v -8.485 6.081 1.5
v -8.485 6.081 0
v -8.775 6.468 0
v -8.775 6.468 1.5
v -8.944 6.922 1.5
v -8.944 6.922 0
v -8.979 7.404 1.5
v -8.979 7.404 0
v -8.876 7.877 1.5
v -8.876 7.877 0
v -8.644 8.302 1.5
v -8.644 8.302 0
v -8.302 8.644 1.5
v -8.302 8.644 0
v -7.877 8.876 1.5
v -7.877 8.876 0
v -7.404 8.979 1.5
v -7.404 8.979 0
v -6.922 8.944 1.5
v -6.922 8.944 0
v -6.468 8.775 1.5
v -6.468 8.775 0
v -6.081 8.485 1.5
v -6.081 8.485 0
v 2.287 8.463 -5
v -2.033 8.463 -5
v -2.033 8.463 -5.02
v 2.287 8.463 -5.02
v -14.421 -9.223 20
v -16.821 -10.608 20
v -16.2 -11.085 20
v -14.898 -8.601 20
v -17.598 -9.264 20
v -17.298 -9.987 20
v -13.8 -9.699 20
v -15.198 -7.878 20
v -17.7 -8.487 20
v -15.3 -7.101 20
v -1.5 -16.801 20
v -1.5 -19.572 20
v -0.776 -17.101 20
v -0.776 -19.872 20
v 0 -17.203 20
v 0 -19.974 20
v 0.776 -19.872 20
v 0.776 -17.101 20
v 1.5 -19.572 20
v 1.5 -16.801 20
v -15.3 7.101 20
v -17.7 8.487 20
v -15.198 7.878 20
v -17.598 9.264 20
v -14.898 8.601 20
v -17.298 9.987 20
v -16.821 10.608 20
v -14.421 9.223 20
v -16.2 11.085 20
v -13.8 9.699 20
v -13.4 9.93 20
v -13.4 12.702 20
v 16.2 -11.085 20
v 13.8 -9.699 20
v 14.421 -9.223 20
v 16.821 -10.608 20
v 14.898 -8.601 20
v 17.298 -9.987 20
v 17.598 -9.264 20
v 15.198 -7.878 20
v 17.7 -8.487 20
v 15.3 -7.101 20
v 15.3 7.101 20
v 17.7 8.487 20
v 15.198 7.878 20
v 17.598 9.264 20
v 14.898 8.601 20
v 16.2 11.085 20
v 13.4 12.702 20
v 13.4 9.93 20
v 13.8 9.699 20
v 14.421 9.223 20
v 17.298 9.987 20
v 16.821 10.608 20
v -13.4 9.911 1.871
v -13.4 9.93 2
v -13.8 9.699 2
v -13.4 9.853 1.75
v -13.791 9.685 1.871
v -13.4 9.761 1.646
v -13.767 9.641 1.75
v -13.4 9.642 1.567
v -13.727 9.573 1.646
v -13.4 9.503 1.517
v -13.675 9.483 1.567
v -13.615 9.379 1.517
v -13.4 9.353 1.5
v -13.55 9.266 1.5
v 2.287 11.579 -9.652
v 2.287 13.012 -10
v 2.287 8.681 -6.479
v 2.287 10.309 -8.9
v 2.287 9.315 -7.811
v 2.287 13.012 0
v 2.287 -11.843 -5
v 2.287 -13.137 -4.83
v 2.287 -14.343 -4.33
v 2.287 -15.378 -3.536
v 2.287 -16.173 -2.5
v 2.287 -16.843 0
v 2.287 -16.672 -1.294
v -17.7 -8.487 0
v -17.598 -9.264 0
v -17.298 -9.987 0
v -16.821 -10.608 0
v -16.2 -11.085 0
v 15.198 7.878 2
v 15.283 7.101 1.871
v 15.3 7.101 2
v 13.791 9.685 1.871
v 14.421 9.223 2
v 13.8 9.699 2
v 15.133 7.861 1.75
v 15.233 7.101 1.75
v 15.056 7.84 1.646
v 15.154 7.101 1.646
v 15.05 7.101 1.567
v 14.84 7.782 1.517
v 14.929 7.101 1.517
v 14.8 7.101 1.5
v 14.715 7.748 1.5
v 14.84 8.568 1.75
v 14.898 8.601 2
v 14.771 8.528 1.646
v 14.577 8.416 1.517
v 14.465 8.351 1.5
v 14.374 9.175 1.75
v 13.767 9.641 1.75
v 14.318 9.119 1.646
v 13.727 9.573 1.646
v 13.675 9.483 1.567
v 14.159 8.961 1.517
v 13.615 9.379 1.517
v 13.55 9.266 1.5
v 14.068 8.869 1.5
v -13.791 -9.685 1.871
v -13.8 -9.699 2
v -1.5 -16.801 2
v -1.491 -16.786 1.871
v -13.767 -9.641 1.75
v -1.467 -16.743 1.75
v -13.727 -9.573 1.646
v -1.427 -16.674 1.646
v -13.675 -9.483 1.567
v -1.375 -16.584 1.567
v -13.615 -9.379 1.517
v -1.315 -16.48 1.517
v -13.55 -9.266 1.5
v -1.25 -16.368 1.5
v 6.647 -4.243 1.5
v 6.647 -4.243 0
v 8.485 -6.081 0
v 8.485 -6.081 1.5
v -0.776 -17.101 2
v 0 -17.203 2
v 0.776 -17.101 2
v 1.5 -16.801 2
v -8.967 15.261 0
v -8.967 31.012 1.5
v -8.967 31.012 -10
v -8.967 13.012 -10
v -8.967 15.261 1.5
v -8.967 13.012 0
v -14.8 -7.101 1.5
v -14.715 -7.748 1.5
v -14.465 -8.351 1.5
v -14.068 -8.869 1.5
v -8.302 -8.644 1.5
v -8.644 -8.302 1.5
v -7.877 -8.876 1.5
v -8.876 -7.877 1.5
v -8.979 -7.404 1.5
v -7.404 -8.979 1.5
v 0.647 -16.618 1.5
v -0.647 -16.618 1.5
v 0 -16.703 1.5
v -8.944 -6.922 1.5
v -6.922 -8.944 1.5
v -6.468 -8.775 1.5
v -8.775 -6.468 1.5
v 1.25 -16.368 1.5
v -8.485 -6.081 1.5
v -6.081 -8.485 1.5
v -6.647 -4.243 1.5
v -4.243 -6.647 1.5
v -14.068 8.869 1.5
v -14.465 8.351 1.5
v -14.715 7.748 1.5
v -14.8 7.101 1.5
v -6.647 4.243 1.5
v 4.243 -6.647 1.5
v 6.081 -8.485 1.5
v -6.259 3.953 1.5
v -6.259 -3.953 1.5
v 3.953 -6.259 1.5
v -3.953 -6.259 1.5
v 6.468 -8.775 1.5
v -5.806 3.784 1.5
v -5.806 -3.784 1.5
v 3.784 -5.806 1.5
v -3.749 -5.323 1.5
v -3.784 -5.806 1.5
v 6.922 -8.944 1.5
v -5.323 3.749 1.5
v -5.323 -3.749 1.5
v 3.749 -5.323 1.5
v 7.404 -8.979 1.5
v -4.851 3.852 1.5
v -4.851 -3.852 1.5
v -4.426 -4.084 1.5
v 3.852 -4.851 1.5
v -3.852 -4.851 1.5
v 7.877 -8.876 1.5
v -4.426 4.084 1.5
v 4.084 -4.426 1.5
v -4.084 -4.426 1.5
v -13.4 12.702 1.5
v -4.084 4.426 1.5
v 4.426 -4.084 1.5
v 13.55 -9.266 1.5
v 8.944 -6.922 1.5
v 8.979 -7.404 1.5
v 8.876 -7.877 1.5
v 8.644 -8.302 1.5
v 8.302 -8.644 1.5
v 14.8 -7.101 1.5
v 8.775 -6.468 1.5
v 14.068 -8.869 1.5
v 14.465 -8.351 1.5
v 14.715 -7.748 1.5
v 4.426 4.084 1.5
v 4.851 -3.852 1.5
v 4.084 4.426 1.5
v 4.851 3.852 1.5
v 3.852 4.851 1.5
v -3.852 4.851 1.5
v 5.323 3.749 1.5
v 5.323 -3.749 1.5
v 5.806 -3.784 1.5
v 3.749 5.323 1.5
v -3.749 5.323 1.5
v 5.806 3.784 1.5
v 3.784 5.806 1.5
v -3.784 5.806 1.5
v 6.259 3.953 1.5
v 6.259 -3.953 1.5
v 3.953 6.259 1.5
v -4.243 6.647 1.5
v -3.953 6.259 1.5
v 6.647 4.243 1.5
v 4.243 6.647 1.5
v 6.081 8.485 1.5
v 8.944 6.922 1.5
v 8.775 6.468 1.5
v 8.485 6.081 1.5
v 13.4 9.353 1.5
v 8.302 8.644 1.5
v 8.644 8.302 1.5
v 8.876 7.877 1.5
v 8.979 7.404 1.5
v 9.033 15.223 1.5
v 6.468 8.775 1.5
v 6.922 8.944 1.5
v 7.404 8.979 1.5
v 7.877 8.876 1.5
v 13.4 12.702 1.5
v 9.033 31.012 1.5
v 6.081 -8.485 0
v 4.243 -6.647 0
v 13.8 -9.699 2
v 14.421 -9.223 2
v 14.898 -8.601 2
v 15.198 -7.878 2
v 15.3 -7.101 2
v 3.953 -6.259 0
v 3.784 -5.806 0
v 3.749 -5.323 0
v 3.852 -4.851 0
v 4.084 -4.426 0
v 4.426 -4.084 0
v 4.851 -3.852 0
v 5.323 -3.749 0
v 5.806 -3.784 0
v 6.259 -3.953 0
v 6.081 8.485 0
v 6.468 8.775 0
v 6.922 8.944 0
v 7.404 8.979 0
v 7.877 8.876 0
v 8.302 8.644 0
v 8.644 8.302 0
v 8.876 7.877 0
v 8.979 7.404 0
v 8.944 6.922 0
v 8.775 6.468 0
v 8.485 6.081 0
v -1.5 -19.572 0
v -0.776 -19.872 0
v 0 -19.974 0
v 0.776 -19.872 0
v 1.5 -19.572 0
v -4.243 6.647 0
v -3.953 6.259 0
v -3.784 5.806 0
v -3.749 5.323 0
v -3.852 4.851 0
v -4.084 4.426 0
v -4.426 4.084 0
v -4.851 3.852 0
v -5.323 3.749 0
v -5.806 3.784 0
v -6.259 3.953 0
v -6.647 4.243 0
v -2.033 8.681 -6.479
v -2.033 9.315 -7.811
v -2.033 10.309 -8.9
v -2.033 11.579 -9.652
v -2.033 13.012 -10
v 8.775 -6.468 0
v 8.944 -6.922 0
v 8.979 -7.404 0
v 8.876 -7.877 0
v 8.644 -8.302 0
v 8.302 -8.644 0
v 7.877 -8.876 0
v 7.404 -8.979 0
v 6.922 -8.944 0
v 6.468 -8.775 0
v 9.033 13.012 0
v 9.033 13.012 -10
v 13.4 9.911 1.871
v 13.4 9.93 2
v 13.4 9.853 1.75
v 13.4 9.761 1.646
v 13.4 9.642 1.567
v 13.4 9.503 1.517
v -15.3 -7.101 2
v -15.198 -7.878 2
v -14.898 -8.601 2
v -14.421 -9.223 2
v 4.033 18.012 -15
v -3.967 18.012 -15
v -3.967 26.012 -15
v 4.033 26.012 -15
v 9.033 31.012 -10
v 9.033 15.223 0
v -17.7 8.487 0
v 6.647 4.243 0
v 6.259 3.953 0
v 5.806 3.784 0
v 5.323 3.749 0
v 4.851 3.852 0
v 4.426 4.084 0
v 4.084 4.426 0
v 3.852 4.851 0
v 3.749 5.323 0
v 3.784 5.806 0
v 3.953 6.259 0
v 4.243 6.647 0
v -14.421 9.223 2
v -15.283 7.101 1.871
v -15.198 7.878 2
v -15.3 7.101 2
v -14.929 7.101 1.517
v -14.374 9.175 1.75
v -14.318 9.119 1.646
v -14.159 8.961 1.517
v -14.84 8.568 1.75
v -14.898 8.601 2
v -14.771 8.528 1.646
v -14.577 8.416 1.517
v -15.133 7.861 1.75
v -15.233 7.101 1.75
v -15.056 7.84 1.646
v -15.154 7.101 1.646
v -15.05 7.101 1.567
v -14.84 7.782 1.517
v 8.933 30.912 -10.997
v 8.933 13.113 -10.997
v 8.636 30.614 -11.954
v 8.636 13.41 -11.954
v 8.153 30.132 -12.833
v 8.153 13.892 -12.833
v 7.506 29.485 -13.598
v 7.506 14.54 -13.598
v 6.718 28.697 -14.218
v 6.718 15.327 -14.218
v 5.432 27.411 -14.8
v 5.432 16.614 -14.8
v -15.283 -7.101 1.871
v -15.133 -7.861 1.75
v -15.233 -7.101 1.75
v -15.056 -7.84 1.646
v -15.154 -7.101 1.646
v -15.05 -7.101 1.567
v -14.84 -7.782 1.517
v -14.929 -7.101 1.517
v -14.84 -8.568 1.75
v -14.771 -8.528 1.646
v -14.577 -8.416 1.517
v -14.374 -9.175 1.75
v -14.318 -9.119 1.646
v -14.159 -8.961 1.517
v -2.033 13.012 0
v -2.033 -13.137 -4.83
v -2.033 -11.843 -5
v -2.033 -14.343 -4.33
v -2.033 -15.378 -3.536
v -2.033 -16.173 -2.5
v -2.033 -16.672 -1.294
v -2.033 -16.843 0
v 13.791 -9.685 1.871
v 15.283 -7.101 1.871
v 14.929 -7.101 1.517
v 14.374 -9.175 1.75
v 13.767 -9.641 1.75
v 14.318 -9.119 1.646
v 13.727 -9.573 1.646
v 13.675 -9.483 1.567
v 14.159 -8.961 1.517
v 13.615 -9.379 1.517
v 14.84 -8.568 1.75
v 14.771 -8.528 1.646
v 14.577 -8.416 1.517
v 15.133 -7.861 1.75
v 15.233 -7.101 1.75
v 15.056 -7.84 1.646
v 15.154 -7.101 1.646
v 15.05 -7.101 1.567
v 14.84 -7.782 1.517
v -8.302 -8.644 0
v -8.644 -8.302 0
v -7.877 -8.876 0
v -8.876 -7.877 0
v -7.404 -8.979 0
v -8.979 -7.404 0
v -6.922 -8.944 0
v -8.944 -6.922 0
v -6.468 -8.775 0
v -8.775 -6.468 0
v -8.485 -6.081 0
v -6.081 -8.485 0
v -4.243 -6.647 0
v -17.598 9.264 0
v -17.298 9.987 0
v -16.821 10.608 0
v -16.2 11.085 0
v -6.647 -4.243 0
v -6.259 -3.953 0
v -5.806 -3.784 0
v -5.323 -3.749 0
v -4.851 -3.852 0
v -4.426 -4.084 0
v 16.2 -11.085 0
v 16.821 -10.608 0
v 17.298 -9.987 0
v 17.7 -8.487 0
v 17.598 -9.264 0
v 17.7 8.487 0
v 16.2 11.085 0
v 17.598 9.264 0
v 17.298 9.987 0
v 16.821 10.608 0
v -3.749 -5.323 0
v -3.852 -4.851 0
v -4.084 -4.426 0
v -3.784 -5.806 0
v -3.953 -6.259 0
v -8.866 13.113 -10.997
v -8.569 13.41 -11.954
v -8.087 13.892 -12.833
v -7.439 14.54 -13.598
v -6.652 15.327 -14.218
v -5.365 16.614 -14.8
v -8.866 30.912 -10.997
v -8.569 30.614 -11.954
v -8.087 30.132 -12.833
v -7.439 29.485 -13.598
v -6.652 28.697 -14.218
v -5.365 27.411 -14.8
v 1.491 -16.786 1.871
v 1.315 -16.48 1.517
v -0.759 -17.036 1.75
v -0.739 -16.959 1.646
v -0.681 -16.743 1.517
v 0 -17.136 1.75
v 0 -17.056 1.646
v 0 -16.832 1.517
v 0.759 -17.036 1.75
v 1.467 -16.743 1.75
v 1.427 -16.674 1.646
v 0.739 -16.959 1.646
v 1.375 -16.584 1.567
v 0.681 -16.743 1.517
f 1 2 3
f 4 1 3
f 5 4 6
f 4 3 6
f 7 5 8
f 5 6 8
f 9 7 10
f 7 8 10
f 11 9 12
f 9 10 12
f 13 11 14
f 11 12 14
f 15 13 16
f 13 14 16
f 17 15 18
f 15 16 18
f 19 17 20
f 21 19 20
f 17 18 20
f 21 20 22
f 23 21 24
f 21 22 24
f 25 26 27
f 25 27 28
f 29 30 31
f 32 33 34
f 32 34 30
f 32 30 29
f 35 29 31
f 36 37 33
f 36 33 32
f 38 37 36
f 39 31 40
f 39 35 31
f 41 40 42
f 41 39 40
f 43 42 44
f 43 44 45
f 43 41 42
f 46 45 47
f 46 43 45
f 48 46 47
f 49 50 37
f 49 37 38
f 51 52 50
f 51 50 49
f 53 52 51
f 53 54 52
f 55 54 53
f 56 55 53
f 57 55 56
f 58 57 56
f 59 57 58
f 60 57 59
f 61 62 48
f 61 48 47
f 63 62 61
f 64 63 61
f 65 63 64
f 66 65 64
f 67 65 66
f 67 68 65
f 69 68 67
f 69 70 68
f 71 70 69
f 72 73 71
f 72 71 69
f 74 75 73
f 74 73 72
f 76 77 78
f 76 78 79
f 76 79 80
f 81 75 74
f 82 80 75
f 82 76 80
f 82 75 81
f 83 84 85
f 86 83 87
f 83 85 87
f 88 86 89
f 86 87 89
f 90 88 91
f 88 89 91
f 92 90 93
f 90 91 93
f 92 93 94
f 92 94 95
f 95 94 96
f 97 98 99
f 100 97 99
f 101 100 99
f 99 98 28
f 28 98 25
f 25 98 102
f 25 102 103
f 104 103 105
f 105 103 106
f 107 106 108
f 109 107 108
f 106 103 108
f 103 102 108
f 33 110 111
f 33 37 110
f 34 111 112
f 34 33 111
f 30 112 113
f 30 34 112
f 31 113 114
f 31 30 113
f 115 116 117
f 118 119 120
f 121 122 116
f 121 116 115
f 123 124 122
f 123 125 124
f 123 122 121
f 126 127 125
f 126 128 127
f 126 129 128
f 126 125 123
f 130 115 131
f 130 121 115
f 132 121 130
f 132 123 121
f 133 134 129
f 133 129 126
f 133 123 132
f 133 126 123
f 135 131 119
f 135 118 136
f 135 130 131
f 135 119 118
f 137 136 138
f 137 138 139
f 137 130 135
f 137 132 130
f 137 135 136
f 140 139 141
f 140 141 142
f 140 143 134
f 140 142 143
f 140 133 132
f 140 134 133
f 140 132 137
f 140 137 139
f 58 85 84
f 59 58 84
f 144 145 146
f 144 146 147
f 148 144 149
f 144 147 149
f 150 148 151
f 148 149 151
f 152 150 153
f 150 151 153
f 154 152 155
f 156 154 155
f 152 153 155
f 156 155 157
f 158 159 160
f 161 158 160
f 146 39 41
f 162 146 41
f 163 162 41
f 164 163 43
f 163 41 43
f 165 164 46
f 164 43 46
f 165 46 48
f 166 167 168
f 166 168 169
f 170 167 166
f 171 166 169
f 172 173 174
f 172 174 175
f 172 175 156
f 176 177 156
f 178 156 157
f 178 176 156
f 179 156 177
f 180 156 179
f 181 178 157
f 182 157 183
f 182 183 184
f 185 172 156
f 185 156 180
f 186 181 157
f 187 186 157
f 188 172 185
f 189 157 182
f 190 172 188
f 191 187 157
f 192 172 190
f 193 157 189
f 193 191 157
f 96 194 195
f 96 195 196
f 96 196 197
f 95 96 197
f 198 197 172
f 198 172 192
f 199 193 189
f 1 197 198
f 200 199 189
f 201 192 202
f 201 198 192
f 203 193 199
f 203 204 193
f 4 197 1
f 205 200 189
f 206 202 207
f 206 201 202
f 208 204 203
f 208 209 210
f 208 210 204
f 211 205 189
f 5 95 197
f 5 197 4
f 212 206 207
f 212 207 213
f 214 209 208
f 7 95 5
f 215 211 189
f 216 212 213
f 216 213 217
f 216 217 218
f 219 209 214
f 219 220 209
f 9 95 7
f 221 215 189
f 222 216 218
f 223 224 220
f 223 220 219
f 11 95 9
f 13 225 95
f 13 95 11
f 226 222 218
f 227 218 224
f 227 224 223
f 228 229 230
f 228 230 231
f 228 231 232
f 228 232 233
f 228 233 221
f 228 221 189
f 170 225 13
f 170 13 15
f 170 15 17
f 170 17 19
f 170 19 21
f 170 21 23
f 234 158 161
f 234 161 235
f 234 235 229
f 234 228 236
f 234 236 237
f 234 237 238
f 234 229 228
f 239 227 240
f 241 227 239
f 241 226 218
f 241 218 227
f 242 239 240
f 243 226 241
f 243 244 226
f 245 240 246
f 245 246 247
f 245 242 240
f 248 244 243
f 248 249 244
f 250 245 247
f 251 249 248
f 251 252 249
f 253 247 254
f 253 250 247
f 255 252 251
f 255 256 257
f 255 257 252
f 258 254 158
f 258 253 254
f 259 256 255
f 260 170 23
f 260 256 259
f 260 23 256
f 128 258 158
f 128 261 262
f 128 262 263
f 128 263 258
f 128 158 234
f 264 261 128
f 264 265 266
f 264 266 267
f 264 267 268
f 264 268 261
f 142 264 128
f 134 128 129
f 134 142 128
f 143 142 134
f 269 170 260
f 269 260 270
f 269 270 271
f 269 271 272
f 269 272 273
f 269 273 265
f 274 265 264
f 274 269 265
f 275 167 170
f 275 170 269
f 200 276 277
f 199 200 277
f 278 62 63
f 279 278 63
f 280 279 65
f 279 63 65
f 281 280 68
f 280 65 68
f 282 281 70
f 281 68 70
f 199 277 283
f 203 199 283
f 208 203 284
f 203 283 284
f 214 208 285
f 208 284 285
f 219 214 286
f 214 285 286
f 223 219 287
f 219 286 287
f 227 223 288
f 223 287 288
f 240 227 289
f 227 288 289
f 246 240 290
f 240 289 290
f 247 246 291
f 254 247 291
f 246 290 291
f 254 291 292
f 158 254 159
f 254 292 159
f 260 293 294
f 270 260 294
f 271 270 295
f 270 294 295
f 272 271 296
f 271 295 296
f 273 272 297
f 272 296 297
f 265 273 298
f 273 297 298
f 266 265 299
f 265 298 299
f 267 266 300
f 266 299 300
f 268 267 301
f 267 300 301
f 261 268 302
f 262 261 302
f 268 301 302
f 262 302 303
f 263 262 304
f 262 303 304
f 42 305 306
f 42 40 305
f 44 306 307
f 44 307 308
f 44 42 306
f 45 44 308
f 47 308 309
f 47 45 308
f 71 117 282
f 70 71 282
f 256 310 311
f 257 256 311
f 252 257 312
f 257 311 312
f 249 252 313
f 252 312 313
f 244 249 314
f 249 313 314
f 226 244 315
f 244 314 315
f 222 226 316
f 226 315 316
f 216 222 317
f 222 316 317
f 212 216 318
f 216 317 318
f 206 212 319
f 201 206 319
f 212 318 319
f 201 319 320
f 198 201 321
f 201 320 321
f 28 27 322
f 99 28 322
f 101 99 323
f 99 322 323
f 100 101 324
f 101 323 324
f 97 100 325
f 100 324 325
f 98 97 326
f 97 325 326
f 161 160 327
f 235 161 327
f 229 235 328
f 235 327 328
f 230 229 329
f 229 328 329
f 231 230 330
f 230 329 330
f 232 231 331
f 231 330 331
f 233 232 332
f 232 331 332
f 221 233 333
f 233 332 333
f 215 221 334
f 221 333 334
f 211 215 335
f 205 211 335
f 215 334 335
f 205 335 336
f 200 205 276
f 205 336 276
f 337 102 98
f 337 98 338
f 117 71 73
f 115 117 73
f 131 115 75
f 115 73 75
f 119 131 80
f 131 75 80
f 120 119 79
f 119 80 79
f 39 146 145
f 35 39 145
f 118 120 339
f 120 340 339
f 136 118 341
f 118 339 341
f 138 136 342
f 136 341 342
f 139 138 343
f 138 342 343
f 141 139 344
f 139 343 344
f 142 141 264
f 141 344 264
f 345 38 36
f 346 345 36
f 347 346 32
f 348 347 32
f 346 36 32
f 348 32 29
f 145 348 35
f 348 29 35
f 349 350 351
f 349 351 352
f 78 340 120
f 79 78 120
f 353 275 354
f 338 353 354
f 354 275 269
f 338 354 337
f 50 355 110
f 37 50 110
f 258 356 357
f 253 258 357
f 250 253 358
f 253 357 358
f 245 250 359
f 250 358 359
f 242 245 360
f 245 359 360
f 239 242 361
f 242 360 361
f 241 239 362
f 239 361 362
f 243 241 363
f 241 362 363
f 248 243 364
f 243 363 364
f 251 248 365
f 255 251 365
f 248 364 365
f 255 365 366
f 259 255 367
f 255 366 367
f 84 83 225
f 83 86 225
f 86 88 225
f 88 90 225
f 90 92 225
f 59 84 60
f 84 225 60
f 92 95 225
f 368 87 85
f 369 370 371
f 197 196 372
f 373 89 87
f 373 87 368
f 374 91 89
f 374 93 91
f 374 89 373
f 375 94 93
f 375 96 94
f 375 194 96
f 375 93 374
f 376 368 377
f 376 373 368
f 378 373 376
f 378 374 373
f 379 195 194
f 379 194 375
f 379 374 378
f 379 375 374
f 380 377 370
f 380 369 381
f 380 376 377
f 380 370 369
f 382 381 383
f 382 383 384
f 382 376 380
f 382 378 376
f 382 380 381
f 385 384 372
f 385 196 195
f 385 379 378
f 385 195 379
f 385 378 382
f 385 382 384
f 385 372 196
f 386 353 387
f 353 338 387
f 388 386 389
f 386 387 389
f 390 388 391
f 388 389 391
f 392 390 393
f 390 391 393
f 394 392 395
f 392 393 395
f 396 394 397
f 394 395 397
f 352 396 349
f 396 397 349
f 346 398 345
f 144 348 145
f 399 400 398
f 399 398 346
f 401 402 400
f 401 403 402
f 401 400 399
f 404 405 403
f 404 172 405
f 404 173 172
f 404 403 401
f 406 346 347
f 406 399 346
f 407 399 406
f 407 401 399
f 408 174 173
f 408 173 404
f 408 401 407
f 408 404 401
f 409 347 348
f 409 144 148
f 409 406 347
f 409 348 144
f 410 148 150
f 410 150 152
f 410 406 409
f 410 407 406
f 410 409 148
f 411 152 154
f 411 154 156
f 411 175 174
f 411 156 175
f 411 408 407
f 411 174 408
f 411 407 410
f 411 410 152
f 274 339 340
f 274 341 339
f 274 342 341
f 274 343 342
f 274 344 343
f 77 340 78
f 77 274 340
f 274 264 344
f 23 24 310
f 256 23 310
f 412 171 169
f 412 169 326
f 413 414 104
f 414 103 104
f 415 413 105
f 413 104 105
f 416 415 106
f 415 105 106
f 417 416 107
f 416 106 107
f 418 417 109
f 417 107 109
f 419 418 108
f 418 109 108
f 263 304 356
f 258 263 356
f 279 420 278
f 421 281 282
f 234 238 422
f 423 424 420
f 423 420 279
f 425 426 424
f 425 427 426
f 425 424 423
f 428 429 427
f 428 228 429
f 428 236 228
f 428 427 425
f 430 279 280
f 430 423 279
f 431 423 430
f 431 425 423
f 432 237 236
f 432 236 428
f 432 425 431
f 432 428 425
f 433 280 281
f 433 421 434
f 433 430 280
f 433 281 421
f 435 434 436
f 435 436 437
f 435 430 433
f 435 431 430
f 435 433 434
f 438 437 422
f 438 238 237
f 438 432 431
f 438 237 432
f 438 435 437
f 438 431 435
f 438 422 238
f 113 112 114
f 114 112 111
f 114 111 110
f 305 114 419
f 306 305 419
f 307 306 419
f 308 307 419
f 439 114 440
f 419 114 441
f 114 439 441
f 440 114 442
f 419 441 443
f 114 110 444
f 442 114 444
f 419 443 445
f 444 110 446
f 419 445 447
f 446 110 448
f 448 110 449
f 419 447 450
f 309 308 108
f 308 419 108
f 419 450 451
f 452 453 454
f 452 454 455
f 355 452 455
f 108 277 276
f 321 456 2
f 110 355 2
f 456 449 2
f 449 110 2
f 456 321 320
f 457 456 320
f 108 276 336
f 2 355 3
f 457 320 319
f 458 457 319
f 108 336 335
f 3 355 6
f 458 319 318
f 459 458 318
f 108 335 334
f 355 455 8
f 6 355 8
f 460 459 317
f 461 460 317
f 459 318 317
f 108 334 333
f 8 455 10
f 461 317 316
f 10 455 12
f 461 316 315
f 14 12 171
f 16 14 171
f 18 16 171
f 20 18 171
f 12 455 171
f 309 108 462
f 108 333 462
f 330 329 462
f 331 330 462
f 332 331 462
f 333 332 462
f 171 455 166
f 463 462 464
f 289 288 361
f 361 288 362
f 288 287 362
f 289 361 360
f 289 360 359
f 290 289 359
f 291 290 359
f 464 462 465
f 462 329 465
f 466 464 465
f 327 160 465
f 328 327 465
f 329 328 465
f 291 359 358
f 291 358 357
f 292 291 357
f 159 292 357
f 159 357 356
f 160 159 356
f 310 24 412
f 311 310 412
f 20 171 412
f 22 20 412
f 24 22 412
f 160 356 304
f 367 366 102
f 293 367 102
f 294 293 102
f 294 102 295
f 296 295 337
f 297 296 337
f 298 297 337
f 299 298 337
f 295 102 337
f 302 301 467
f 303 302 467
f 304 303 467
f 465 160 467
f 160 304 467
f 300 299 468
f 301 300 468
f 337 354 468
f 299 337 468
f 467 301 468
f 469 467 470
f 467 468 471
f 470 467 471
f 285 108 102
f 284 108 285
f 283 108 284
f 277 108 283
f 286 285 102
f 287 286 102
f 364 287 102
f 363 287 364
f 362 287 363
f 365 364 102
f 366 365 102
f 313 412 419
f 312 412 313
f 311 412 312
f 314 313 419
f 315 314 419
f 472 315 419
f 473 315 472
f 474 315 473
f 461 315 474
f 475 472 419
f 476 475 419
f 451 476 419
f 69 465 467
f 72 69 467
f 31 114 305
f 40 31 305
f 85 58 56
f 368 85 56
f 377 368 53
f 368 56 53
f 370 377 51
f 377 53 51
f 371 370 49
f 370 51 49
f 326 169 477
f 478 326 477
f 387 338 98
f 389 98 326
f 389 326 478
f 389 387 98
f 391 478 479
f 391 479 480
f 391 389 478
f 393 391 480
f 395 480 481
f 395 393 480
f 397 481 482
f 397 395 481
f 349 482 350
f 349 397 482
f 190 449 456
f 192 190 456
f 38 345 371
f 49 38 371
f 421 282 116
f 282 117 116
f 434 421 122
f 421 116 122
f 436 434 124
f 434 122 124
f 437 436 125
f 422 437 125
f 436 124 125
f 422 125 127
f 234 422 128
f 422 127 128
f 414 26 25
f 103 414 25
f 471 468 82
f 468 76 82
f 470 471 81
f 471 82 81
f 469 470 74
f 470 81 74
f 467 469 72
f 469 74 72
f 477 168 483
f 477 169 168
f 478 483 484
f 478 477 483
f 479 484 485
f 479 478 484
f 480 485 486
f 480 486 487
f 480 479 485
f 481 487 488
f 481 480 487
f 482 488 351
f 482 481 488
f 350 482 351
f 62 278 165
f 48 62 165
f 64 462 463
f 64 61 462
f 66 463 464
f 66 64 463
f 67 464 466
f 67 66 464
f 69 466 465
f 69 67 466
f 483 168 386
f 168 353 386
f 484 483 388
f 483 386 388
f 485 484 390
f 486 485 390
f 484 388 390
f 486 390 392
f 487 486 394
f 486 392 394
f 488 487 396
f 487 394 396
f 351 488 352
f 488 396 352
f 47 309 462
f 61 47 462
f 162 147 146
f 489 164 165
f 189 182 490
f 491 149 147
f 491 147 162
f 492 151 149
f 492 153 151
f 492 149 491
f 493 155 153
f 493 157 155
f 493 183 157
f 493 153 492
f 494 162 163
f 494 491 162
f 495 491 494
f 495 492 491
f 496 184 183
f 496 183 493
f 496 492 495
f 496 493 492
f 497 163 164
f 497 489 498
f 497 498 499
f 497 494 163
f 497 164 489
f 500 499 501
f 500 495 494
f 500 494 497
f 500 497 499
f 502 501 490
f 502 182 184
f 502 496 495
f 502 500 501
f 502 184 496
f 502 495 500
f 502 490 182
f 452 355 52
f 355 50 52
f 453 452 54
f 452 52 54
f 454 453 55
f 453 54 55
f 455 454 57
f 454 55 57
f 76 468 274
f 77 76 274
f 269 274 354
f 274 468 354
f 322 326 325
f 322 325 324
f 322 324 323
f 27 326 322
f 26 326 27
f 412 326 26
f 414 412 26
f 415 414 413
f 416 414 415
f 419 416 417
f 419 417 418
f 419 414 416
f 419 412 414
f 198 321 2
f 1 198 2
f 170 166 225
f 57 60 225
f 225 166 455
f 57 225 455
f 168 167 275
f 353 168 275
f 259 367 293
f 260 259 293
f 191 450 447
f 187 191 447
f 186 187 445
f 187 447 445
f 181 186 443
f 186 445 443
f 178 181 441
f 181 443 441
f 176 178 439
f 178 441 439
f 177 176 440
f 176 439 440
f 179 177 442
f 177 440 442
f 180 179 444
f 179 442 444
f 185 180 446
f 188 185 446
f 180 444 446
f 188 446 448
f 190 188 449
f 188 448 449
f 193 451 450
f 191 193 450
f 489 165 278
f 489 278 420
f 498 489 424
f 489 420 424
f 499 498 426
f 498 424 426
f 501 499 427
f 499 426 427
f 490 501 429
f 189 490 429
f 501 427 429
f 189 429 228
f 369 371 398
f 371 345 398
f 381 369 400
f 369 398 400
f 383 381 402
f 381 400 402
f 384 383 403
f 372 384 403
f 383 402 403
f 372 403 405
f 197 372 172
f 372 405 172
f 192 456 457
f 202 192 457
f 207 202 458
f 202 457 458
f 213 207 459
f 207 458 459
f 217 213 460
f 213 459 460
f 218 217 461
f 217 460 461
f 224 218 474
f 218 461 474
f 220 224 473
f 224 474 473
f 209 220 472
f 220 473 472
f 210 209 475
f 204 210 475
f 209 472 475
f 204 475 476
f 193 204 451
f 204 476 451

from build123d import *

# Parameters (mm, degrees)
F1_DEPTH     = 1.5
F2_DEPTH     = 20
F4_W         = 26.8
F4_H         = 20.4379309565
F5_DEPTH     = 26
F6_R         = 3
F7_R         = 0.5
F9_DEPTH     = 1.5
F10_W        = 18
F10_H        = 18
F11_DEPTH    = 15
F12_R        = 5
F13_W        = 4.3204394169
F13_H        = 29.8547168866
F14_DEPTH    = 5
F15_R        = 4.99999
F16_W        = 4.3204394169
F16_H        = 4.5489102274
F17_DEPTH    = 5
F18_T1_DEPTH = 29.218490554


# Not quite as in the source:
# - a fillet or chamfer that OpenCascade refuses, or shapes differently, is made with other operations: its cross-section is extruded or revolved along the edge and cut away or added
# - a fillet or chamfer is up to 0.001 mm smaller than in the source, because OpenCascade refuses the exact size


with BuildPart() as f1:
    # F0 (on Top) → F1 (new body)
    with BuildSketch(Plane.XY):
        Polygon((0, -17.6669182372), (15.3, -8.8334591186), (15.3, 8.8334591186), (0, 17.6669182372), (-15.3, 8.8334591186), (-15.3, -8.8334591186), align=None)
        with BuildLine():
            ThreePointArc((-6.0811183182, -8.4852813742), (-8.4852813742, -8.4852813742), (-8.4852813742, -6.0811183182))
            Line((-8.4852813742, -6.0811183182), (-6.6468037432, -4.2426406871))
            ThreePointArc((-6.6468037432, -4.2426406871), (-4.2426406871, -4.2426406871), (-4.2426406871, -6.6468037432))
            Line((-4.2426406871, -6.6468037432), (-6.0811183182, -8.4852813742))
        make_face(mode=Mode.SUBTRACT)
        with BuildLine():
            ThreePointArc((8.4852813742, -6.0811183182), (8.4852813742, -8.4852813742), (6.0811183182, -8.4852813742))
            Line((6.0811183182, -8.4852813742), (4.2426406871, -6.6468037432))
            ThreePointArc((4.2426406871, -6.6468037432), (4.2426406871, -4.2426406871), (6.6468037432, -4.2426406871))
            Line((6.6468037432, -4.2426406871), (8.4852813742, -6.0811183182))
        make_face(mode=Mode.SUBTRACT)
        with BuildLine():
            ThreePointArc((-8.4852813742, 6.0811183182), (-8.4852813742, 8.4852813742), (-6.0811183182, 8.4852813742))
            Line((-6.0811183182, 8.4852813742), (-4.2426406871, 6.6468037432))
            ThreePointArc((-4.2426406871, 6.6468037432), (-4.2426406871, 4.2426406871), (-6.6468037432, 4.2426406871))
            Line((-6.6468037432, 4.2426406871), (-8.4852813742, 6.0811183182))
        make_face(mode=Mode.SUBTRACT)
        with BuildLine():
            Line((4.2426406871, 6.6468037432), (6.0811183182, 8.4852813742))
            ThreePointArc((6.0811183182, 8.4852813742), (8.4852813742, 8.4852813742), (8.4852813742, 6.0811183182))
            Line((8.4852813742, 6.0811183182), (6.6468037432, 4.2426406871))
            ThreePointArc((6.6468037432, 4.2426406871), (4.2426406871, 4.2426406871), (4.2426406871, 6.6468037432))
        make_face(mode=Mode.SUBTRACT)
    extrude(amount=F1_DEPTH)

    # F0 (on Top) → F2 (join)
    with BuildSketch(Plane.XY):
        Polygon((-17.7, 10.2190997647), (-17.7, -10.2190997647), (0, -20.4381995293), (17.7, -10.2190997647), (17.7, 10.2190997647), (0, 20.4381995293), align=None)
        Polygon((15.3, 8.8334591186), (15.3, -8.8334591186), (0, -17.6669182372), (-15.3, -8.8334591186), (-15.3, 8.8334591186), (0, 17.6669182372), align=None, mode=Mode.SUBTRACT)
    extrude(amount=F2_DEPTH)

    # F4 (on offset) → F5 (cut)
    with BuildSketch(Plane.XZ.offset(-25)):
        with Locations((0, 11.7189654782)):
            Rectangle(F4_W, F4_H)
    extrude(amount=F5_DEPTH, mode=Mode.SUBTRACT)

    # F6
    f6_edges = [f1.edges().sort_by_distance(p)[0] for p in [
        (17.7, 10.2191, 10),
        (-17.7, 10.2191, 10),
        (-17.7, -10.2191, 10),
        (0, -20.4382, 10),
        (17.7, -10.2191, 10),
        (15.3, 8.833459, 10.75),
        (15.3, -8.833459, 10.75),
        (0, -17.666918, 10.75),
        (-15.3, -8.833459, 10.75),
        (-15.3, 8.833459, 10.75),
    ]]
    fillet(f6_edges, radius=F6_R)

    # F7
    f7_edges = [f1.edges().sort_by_distance(p)[0] for p in [
        (-13.6, 9.814955, 1.5),
        (0, 20.4382, 0.75),
        (-7.65, -13.250189, 1.5),
        (-14.898076, -8.601408, 1.5),
        (0, -17.202817, 1.5),
        (-15.3, 0, 1.5),
        (7.65, -13.250189, 1.5),
        (-14.898076, 8.601408, 1.5),
        (14.898076, -8.601408, 1.5),
        (15.3, 0, 1.5),
        (14.898076, 8.601408, 1.5),
        (13.6, 9.814955, 1.5),
    ]]
    fillet(f7_edges, radius=F7_R)

    # F8 (on face) → F9 (join)
    with BuildSketch(Plane.XY.offset(1.5)):
        with BuildLine():
            Line((-8.9667634256, 31.0121076152), (-8.9667634256, 15.2612362518))
            Line((-8.9667634256, 15.2612362518), (-0.25, 20.293861962))
            ThreePointArc((-0.25, 20.293861962), (0, 20.3608492601), (0.25, 20.293861962))
            Line((0.25, 20.293861962), (9.0332365744, 15.2228579614))
            Line((9.0332365744, 15.2228579614), (9.0332365744, 31.0121076152))
            Line((9.0332365744, 31.0121076152), (-8.9667634256, 31.0121076152))
        make_face()
    extrude(amount=-F9_DEPTH)

    # F10 (on face) → F11 (join)
    with BuildSketch(Plane(origin=(0, 0, 0), x_dir=(1, 0, 0), z_dir=(0, 0, -1))):
        with Locations((0.0332365744, -22.0121076152)):
            Rectangle(F10_W, F10_H)
    extrude(amount=F11_DEPTH)

    # F12
    f12_edges = [f1.edges().sort_by_distance(p)[0] for p in [
        (9.033237, 22.012108, -15),
        (0.033237, 13.012108, -15),
        (-8.966763, 22.012108, -15),
        (0.033237, 31.012108, -15),
    ]]
    fillet(f12_edges, radius=F12_R)

    # F13 (on face) → F14 (join)
    with BuildSketch(Plane(origin=(0, 0, 0), x_dir=(1, 0, 0), z_dir=(0, 0, -1))):
        with Locations((0.1270717476, 1.9152508281)):
            Rectangle(F13_W, F13_H)
    extrude(amount=F14_DEPTH)

    # F15 (radius 5 in the source; OpenCascade refuses exactly that, so slightly less here)
    f15_edges = [f1.edges().sort_by_distance(p)[0] for p in [
        (0.127072, -16.842609, -5),
    ]]
    fillet(f15_edges, radius=F15_R)

    # F16 (on face) → F17 (join)
    with BuildSketch(Plane(origin=(0, 0, -5), x_dir=(1, 0, 0), z_dir=(0, 0, -1))):
        with Locations((0.1270717476, -10.7376525015)):
            Rectangle(F16_W, F16_H)
    extrude(amount=F17_DEPTH)

    # F18: fillet of radius 5 on 1 edges, made by hand

    # F18_s2 → F18_t1 (cut)
    with BuildSketch(Plane.YZ.offset(-14.4821735295)):
        with BuildLine():
            ThreePointArc((8.4631973878, -5.0203897726), (9.7716225976, -8.3926702426), (13.0121076152, -10))
            Line((13.0121076152, -10), (13.0030858197, -10.0995922045))
            ThreePointArc((13.0030858197, -10.0995922045), (10.7376525015, -10.1), (8.4631973878, -10.1))
            Line((8.4631973878, -10.1), (8.3631973878, -10))
            Line((8.3631973878, -10), (8.3631973878, -5.0203897726))
            Line((8.3631973878, -5.0203897726), (8.4631973878, -5.0203897726))
        make_face()
    extrude(amount=F18_T1_DEPTH, mode=Mode.SUBTRACT)


solid = f1.part
